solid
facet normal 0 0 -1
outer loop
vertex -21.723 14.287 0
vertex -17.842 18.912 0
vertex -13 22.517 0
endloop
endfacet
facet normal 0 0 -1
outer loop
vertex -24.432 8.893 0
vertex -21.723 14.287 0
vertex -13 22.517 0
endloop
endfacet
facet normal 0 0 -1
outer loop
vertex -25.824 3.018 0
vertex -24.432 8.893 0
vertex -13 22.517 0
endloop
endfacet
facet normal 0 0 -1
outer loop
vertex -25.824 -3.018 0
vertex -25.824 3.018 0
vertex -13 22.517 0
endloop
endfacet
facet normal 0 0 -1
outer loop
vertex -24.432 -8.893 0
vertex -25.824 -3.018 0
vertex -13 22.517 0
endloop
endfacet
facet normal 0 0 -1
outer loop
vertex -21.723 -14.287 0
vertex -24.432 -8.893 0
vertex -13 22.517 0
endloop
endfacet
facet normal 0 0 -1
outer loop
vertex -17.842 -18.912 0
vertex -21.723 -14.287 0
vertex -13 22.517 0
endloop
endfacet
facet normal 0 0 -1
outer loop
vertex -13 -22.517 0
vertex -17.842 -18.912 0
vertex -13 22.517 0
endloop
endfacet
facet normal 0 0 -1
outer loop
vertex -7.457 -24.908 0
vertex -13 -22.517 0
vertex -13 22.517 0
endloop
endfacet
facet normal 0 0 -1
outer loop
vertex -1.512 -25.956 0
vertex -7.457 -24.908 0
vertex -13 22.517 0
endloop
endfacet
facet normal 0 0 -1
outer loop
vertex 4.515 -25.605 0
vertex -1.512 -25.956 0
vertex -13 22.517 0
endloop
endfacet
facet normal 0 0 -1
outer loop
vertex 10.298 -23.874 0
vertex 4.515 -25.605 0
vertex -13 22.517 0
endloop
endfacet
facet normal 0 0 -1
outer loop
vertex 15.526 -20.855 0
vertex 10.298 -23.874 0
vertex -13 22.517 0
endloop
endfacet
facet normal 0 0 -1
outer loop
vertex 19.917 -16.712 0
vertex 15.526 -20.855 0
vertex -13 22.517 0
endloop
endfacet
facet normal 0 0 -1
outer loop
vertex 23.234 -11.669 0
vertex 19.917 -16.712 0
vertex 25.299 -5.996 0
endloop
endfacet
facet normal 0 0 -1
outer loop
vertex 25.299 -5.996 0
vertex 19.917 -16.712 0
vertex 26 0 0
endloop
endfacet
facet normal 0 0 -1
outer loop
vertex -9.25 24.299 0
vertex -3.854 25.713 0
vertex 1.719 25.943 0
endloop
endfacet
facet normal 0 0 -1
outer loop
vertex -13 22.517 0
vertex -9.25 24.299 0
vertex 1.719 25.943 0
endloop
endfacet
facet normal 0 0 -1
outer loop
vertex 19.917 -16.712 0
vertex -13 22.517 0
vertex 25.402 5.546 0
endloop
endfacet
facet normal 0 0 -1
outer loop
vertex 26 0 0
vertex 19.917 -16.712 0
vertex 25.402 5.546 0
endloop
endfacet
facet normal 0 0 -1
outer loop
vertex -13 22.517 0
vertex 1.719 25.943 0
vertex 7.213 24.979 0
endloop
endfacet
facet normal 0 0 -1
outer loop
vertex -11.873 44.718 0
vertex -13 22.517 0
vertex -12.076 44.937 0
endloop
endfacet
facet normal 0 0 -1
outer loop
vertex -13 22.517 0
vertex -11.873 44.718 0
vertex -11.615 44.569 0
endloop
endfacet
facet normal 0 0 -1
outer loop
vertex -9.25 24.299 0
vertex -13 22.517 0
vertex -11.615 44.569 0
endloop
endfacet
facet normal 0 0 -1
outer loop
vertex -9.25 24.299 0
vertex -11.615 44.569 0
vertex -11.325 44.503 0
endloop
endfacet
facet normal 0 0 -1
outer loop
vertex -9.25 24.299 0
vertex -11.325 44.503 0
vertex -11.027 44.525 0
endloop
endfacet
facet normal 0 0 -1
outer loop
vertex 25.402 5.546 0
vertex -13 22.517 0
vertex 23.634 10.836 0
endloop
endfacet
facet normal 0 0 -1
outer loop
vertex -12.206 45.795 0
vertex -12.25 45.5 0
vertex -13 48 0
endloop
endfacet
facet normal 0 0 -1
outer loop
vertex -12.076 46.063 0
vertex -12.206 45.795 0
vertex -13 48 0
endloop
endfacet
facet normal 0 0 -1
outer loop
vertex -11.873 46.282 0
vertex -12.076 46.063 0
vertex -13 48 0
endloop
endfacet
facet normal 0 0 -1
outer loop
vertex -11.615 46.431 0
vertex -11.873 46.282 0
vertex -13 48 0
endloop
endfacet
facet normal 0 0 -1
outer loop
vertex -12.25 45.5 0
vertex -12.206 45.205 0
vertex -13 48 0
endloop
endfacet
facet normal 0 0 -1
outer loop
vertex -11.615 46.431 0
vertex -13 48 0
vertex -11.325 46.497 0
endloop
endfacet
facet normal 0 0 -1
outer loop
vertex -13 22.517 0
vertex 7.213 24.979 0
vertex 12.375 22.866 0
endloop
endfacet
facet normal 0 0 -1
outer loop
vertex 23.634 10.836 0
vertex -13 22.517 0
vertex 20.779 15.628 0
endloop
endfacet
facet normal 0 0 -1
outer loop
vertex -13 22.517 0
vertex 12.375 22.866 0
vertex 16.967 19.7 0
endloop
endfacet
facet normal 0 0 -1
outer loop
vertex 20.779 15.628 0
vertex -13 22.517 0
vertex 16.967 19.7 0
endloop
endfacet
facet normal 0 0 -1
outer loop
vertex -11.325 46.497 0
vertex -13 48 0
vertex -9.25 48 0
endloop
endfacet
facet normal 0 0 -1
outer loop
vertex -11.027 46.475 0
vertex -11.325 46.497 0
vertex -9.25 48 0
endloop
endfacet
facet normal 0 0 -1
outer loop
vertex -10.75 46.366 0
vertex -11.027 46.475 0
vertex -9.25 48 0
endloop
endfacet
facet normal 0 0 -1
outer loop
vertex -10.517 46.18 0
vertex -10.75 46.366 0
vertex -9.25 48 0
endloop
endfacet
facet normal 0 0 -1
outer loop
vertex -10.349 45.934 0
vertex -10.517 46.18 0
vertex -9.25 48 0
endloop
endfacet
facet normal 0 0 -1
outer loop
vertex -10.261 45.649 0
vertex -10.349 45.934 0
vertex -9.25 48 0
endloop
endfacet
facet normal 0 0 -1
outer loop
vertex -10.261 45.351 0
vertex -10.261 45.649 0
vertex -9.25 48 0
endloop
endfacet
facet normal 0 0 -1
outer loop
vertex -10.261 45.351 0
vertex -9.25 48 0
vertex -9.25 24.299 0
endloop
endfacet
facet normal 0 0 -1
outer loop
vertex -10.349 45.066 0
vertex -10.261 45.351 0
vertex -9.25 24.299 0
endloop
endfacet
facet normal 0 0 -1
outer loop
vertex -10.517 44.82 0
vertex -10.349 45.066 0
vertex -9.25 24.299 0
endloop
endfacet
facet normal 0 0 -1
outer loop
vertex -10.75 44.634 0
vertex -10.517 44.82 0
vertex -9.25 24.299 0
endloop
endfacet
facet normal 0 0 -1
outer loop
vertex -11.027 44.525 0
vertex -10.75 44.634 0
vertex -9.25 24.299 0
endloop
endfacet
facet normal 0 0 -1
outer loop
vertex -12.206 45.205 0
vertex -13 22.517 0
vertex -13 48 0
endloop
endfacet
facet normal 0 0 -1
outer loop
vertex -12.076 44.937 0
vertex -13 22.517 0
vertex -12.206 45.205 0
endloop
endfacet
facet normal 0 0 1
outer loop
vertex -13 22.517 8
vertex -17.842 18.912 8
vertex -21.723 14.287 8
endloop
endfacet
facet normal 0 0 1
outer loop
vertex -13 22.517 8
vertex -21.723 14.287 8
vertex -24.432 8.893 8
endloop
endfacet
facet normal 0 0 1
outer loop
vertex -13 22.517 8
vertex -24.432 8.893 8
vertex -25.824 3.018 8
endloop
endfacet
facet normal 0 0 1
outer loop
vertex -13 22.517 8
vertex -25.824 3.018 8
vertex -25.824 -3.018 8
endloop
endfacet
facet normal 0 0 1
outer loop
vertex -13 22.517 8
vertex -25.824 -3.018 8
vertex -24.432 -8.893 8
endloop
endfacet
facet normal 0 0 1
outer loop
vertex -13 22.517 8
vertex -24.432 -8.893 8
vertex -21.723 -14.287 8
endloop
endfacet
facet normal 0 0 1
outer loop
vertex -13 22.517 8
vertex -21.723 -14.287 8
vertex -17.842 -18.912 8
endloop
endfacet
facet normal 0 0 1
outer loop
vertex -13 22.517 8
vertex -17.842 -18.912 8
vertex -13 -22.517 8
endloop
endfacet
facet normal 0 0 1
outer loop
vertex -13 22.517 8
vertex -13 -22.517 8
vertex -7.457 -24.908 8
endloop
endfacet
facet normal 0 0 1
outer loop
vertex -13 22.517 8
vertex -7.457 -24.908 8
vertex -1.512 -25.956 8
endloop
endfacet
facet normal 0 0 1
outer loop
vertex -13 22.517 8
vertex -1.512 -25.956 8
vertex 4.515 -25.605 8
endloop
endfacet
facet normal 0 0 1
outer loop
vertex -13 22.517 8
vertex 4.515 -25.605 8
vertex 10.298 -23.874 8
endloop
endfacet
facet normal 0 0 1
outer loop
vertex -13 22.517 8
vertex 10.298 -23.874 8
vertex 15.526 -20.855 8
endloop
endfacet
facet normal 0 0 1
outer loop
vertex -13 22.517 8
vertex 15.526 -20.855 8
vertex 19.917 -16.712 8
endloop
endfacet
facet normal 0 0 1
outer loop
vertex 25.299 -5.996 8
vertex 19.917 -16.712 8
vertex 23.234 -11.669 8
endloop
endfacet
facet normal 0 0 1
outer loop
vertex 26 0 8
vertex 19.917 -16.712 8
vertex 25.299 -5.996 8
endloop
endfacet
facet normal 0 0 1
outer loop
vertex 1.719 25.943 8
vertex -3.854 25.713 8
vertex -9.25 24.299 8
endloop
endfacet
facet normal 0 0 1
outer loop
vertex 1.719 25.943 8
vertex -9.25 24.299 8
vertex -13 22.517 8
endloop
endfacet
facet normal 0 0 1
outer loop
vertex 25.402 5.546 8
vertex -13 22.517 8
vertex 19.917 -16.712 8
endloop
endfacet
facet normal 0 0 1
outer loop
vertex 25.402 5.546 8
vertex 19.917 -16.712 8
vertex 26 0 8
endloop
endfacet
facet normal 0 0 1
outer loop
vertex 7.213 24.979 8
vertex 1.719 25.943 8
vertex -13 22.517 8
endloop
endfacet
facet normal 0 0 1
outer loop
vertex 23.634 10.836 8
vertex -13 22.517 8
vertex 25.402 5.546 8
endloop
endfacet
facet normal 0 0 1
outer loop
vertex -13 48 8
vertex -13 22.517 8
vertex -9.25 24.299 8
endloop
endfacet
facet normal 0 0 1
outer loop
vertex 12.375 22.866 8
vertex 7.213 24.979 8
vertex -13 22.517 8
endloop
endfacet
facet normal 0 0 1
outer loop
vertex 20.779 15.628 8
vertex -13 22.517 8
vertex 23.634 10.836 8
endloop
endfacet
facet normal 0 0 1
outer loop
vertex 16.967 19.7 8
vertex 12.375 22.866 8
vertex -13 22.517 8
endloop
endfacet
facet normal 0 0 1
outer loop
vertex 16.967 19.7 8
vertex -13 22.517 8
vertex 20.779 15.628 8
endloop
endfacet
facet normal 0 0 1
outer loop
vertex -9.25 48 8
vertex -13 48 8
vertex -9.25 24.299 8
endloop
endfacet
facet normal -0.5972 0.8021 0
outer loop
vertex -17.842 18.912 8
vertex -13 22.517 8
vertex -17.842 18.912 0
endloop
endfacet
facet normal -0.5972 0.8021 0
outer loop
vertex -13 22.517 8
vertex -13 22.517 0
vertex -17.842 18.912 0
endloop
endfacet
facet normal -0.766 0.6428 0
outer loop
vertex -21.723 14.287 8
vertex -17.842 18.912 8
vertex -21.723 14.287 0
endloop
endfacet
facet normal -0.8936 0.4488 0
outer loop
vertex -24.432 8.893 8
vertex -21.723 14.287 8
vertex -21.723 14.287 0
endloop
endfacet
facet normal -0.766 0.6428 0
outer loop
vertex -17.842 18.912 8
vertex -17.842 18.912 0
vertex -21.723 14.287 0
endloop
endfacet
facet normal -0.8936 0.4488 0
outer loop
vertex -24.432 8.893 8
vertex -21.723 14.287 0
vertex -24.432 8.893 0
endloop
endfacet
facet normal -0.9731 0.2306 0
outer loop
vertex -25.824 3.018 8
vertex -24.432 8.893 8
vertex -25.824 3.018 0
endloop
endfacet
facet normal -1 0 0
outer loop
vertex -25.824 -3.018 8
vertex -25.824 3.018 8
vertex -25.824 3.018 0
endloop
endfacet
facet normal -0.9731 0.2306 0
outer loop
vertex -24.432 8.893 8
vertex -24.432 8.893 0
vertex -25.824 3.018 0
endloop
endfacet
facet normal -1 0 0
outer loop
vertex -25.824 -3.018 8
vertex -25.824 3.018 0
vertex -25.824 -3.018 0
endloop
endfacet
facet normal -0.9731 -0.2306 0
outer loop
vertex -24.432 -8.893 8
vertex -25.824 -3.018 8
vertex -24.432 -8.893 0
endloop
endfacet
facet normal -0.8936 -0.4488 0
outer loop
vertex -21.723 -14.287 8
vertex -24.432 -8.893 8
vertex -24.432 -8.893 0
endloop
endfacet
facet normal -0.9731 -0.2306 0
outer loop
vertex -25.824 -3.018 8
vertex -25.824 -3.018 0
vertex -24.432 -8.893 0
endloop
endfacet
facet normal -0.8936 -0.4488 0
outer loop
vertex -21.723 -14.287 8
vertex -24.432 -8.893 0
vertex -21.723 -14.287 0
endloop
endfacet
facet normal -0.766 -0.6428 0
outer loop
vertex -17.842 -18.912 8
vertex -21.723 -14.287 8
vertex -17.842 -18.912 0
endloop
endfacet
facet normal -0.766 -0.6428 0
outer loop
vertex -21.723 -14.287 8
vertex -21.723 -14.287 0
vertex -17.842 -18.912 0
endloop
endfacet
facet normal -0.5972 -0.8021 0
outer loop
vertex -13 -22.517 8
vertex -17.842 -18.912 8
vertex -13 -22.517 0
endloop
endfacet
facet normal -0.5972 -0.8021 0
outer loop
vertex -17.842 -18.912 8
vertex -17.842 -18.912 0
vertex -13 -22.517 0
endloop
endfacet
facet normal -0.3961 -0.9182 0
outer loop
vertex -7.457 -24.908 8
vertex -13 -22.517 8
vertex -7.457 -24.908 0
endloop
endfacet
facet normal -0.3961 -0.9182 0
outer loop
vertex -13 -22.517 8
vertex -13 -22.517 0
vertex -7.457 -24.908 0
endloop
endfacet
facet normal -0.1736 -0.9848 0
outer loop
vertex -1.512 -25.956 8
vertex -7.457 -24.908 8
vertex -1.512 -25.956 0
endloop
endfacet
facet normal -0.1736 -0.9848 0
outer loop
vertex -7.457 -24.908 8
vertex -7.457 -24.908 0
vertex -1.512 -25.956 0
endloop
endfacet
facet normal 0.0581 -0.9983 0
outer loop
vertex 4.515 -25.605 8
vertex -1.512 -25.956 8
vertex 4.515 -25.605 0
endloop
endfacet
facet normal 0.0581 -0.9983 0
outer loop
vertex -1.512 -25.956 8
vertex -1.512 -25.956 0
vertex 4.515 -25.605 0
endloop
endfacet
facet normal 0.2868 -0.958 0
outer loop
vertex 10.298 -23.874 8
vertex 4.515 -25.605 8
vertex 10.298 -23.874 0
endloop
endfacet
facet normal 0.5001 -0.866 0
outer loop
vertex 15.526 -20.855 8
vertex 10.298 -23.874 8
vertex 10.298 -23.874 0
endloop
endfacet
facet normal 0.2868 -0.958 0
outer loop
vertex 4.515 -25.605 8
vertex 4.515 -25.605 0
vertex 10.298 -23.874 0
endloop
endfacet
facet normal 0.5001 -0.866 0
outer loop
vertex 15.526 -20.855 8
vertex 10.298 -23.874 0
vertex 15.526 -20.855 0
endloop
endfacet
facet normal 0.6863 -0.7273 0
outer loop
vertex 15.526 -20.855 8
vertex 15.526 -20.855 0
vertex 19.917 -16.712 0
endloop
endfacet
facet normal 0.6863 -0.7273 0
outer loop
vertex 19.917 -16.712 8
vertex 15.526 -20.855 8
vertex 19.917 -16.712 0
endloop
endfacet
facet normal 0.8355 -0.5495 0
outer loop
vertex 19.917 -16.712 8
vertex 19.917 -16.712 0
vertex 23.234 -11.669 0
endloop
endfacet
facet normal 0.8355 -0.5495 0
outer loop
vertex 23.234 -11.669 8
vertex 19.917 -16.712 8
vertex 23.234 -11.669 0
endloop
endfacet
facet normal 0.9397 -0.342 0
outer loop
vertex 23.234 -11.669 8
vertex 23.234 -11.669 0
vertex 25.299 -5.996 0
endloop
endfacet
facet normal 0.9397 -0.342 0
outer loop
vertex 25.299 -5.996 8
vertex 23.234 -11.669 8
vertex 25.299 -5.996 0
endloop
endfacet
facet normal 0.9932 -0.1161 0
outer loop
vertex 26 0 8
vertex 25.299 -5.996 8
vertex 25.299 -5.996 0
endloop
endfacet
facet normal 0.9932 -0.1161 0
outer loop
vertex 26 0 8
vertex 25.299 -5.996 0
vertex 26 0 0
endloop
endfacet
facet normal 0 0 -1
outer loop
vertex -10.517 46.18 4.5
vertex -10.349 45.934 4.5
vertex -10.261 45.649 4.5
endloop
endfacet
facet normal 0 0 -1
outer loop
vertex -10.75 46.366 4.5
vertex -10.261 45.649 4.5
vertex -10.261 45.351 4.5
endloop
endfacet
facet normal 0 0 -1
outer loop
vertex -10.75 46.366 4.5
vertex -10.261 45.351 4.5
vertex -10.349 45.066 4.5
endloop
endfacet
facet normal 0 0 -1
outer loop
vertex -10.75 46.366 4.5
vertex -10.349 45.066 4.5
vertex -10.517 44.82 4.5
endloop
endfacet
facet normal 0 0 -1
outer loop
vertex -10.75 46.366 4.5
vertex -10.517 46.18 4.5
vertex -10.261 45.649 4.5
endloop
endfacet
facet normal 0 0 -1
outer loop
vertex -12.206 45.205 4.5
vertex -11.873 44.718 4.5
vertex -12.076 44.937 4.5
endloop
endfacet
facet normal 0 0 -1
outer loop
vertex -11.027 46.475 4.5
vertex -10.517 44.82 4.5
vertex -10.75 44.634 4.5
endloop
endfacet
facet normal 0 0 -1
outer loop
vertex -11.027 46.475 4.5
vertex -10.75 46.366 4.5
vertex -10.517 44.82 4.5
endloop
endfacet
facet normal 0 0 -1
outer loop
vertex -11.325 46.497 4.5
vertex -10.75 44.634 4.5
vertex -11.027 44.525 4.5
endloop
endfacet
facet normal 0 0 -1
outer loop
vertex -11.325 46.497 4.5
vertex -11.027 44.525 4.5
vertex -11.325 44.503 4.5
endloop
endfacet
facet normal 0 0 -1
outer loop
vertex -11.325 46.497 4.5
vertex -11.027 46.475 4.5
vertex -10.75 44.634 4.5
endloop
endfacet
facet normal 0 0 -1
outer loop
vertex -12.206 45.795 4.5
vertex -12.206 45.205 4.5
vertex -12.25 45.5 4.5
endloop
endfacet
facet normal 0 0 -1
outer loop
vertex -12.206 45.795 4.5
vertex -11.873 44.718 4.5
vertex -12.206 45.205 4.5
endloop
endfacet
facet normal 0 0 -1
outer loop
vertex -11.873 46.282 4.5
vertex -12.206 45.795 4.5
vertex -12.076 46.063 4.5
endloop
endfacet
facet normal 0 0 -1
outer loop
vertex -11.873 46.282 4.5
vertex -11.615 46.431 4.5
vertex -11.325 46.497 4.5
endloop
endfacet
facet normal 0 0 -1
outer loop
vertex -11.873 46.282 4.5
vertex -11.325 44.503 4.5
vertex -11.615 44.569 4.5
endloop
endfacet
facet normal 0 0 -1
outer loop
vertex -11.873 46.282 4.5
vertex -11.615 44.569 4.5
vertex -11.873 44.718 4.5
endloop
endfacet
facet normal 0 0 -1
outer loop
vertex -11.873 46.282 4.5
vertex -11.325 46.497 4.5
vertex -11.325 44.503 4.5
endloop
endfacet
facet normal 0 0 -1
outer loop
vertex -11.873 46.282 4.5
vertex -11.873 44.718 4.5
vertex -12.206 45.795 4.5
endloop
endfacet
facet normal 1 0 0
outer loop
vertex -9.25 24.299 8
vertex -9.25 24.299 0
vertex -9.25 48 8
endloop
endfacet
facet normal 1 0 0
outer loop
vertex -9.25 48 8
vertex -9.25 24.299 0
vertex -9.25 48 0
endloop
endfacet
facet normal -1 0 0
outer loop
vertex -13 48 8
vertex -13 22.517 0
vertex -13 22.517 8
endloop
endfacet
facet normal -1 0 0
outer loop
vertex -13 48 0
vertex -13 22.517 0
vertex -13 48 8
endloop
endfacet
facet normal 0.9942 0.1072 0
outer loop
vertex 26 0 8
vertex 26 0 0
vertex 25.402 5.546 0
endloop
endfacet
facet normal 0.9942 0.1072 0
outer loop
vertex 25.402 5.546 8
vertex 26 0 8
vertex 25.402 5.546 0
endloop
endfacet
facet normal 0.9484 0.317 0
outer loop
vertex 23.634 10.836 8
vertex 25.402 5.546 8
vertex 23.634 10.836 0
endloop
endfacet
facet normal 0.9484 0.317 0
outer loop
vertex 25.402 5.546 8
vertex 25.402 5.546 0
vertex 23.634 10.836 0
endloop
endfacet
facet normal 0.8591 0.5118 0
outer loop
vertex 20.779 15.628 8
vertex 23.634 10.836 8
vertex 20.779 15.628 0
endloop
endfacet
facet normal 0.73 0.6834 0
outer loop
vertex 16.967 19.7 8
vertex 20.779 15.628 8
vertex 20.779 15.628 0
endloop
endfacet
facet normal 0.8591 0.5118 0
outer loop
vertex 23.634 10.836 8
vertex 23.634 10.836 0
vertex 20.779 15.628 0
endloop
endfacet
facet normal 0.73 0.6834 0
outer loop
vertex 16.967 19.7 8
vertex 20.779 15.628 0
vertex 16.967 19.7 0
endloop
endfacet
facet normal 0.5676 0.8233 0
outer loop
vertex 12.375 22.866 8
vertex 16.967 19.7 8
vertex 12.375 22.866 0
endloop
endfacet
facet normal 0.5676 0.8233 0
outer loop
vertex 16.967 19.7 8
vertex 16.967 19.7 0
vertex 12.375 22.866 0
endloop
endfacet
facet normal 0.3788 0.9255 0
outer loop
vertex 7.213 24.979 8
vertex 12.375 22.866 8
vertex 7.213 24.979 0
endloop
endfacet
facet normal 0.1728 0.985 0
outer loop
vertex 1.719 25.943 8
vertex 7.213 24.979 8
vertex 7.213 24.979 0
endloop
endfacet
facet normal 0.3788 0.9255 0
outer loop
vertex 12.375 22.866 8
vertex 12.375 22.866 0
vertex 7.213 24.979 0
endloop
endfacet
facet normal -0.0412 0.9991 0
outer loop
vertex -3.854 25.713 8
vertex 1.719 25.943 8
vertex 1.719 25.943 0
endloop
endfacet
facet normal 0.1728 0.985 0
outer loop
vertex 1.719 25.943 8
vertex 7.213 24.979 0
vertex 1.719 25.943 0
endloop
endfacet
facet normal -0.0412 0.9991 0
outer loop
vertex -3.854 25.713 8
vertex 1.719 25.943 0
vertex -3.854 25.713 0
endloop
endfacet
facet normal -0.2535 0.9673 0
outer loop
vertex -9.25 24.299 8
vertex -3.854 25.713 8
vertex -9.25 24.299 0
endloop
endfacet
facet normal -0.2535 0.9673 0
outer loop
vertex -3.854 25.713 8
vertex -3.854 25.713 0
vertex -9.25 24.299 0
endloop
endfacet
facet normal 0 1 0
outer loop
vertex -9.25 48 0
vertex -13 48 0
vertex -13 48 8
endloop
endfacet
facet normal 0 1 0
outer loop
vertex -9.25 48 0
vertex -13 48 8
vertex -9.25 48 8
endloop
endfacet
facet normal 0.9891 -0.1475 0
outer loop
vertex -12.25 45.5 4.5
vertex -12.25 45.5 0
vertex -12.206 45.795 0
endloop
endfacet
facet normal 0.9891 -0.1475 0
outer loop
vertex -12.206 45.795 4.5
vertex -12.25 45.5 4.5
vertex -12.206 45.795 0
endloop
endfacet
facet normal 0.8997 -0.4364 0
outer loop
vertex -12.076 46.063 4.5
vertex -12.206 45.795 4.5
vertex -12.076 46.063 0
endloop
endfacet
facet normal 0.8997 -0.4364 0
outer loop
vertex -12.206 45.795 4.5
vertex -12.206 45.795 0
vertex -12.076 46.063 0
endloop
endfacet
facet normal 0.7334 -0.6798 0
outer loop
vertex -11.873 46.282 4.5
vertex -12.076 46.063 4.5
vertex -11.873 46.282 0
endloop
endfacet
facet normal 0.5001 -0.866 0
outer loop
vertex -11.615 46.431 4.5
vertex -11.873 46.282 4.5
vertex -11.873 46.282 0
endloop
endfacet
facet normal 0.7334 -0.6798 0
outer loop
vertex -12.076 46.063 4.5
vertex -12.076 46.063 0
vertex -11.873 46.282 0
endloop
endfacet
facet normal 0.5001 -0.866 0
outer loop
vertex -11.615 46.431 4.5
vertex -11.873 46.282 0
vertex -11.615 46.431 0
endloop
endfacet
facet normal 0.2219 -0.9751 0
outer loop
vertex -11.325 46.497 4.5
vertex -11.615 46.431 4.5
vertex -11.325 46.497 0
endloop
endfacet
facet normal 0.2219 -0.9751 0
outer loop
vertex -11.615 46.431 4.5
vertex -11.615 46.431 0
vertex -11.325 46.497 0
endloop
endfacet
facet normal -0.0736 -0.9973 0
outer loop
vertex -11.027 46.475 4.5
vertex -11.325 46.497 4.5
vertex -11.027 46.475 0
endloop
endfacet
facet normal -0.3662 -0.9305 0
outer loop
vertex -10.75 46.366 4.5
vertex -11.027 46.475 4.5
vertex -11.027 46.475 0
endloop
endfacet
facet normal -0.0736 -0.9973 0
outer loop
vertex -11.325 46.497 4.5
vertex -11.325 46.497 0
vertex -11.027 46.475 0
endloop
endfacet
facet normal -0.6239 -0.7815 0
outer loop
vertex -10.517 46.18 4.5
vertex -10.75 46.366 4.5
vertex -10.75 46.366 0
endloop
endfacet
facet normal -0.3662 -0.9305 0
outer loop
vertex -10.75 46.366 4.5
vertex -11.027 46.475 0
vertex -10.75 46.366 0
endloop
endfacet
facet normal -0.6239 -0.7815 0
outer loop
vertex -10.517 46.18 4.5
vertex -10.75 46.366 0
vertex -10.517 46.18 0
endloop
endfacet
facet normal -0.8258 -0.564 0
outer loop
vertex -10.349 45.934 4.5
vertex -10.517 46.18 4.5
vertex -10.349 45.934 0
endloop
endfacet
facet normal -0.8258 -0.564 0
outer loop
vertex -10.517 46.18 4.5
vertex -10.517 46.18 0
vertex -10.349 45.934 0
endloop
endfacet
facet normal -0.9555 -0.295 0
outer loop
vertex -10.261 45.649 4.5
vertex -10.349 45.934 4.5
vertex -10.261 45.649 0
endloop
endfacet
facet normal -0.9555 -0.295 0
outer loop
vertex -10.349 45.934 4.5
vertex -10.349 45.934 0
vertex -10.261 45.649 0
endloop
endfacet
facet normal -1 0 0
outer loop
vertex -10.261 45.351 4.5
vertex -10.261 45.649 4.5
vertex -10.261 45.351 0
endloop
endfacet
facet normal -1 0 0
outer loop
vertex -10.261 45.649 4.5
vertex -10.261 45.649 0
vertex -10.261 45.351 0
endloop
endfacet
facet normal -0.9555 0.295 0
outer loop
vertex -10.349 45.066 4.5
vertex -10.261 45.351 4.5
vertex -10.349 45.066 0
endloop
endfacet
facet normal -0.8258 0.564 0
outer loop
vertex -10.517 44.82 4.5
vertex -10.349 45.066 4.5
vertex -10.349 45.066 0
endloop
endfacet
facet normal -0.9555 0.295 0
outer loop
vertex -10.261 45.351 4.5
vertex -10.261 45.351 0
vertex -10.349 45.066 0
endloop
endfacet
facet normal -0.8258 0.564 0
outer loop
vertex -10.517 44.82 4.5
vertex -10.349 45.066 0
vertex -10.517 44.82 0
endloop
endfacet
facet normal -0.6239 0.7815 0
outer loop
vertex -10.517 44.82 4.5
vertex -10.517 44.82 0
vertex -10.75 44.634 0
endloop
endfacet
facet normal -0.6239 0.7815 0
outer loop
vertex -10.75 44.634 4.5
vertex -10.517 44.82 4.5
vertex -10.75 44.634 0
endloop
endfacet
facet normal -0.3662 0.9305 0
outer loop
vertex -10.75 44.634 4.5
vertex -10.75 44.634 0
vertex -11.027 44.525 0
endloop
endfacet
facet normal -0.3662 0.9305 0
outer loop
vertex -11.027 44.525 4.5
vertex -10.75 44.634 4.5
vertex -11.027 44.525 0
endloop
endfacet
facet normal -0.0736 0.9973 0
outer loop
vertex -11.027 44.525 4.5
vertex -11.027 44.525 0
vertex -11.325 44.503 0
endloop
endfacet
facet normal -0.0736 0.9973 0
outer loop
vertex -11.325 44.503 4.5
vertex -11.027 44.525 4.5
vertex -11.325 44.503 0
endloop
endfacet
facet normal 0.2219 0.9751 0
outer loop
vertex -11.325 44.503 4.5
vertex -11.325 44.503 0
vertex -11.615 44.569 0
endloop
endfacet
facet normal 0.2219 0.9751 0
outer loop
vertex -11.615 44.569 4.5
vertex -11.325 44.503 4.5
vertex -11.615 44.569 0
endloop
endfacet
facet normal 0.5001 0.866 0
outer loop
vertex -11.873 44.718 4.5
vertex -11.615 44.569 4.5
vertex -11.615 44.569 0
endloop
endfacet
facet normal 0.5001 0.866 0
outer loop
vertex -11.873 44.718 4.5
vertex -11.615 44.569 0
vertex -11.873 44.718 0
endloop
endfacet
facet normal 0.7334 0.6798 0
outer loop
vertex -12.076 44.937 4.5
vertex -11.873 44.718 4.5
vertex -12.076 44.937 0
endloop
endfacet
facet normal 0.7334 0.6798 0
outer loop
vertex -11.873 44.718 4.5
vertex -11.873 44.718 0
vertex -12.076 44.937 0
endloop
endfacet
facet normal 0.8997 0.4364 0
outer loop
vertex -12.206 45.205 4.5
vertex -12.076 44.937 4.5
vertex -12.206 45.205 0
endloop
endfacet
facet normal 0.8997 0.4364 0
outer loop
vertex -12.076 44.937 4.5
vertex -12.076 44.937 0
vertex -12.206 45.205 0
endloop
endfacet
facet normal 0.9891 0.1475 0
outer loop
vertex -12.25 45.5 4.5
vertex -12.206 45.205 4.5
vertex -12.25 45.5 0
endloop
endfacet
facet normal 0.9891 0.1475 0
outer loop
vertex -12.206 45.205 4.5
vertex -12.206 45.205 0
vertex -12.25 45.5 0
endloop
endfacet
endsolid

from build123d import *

# Parameters (mm, degrees)
SKETCH1_R          = 26
PLATE_DEPTH        = 8
SKETCH2_W          = 3.75
SKETCH2_H          = 28
DRIVE_LUG_DEPTH    = 8
SKETCH6_R          = 1
CUT_EXTRUDE5_DEPTH = 4.5


with BuildPart() as part:
    # Sketch1 → PLATE (new body)
    with BuildSketch(Plane.XY):
        Circle(SKETCH1_R)
    extrude(amount=PLATE_DEPTH)

    # Sketch2 → DRIVE_LUG (add)
    with BuildSketch(Plane.XY):
        with Locations((-11.125, 34)):
            Rectangle(SKETCH2_W, SKETCH2_H)
    extrude(amount=DRIVE_LUG_DEPTH)

    # Sketch6 → Cut-Extrude5 (cut)
    with BuildSketch(Plane(origin=(0, 0, 0), x_dir=(-1, 0, 0), z_dir=(0, 0, -1))):
        with Locations((11.25, 45.5)):
            Circle(SKETCH6_R)
    extrude(amount=-CUT_EXTRUDE5_DEPTH, mode=Mode.SUBTRACT)


solid = part.part
